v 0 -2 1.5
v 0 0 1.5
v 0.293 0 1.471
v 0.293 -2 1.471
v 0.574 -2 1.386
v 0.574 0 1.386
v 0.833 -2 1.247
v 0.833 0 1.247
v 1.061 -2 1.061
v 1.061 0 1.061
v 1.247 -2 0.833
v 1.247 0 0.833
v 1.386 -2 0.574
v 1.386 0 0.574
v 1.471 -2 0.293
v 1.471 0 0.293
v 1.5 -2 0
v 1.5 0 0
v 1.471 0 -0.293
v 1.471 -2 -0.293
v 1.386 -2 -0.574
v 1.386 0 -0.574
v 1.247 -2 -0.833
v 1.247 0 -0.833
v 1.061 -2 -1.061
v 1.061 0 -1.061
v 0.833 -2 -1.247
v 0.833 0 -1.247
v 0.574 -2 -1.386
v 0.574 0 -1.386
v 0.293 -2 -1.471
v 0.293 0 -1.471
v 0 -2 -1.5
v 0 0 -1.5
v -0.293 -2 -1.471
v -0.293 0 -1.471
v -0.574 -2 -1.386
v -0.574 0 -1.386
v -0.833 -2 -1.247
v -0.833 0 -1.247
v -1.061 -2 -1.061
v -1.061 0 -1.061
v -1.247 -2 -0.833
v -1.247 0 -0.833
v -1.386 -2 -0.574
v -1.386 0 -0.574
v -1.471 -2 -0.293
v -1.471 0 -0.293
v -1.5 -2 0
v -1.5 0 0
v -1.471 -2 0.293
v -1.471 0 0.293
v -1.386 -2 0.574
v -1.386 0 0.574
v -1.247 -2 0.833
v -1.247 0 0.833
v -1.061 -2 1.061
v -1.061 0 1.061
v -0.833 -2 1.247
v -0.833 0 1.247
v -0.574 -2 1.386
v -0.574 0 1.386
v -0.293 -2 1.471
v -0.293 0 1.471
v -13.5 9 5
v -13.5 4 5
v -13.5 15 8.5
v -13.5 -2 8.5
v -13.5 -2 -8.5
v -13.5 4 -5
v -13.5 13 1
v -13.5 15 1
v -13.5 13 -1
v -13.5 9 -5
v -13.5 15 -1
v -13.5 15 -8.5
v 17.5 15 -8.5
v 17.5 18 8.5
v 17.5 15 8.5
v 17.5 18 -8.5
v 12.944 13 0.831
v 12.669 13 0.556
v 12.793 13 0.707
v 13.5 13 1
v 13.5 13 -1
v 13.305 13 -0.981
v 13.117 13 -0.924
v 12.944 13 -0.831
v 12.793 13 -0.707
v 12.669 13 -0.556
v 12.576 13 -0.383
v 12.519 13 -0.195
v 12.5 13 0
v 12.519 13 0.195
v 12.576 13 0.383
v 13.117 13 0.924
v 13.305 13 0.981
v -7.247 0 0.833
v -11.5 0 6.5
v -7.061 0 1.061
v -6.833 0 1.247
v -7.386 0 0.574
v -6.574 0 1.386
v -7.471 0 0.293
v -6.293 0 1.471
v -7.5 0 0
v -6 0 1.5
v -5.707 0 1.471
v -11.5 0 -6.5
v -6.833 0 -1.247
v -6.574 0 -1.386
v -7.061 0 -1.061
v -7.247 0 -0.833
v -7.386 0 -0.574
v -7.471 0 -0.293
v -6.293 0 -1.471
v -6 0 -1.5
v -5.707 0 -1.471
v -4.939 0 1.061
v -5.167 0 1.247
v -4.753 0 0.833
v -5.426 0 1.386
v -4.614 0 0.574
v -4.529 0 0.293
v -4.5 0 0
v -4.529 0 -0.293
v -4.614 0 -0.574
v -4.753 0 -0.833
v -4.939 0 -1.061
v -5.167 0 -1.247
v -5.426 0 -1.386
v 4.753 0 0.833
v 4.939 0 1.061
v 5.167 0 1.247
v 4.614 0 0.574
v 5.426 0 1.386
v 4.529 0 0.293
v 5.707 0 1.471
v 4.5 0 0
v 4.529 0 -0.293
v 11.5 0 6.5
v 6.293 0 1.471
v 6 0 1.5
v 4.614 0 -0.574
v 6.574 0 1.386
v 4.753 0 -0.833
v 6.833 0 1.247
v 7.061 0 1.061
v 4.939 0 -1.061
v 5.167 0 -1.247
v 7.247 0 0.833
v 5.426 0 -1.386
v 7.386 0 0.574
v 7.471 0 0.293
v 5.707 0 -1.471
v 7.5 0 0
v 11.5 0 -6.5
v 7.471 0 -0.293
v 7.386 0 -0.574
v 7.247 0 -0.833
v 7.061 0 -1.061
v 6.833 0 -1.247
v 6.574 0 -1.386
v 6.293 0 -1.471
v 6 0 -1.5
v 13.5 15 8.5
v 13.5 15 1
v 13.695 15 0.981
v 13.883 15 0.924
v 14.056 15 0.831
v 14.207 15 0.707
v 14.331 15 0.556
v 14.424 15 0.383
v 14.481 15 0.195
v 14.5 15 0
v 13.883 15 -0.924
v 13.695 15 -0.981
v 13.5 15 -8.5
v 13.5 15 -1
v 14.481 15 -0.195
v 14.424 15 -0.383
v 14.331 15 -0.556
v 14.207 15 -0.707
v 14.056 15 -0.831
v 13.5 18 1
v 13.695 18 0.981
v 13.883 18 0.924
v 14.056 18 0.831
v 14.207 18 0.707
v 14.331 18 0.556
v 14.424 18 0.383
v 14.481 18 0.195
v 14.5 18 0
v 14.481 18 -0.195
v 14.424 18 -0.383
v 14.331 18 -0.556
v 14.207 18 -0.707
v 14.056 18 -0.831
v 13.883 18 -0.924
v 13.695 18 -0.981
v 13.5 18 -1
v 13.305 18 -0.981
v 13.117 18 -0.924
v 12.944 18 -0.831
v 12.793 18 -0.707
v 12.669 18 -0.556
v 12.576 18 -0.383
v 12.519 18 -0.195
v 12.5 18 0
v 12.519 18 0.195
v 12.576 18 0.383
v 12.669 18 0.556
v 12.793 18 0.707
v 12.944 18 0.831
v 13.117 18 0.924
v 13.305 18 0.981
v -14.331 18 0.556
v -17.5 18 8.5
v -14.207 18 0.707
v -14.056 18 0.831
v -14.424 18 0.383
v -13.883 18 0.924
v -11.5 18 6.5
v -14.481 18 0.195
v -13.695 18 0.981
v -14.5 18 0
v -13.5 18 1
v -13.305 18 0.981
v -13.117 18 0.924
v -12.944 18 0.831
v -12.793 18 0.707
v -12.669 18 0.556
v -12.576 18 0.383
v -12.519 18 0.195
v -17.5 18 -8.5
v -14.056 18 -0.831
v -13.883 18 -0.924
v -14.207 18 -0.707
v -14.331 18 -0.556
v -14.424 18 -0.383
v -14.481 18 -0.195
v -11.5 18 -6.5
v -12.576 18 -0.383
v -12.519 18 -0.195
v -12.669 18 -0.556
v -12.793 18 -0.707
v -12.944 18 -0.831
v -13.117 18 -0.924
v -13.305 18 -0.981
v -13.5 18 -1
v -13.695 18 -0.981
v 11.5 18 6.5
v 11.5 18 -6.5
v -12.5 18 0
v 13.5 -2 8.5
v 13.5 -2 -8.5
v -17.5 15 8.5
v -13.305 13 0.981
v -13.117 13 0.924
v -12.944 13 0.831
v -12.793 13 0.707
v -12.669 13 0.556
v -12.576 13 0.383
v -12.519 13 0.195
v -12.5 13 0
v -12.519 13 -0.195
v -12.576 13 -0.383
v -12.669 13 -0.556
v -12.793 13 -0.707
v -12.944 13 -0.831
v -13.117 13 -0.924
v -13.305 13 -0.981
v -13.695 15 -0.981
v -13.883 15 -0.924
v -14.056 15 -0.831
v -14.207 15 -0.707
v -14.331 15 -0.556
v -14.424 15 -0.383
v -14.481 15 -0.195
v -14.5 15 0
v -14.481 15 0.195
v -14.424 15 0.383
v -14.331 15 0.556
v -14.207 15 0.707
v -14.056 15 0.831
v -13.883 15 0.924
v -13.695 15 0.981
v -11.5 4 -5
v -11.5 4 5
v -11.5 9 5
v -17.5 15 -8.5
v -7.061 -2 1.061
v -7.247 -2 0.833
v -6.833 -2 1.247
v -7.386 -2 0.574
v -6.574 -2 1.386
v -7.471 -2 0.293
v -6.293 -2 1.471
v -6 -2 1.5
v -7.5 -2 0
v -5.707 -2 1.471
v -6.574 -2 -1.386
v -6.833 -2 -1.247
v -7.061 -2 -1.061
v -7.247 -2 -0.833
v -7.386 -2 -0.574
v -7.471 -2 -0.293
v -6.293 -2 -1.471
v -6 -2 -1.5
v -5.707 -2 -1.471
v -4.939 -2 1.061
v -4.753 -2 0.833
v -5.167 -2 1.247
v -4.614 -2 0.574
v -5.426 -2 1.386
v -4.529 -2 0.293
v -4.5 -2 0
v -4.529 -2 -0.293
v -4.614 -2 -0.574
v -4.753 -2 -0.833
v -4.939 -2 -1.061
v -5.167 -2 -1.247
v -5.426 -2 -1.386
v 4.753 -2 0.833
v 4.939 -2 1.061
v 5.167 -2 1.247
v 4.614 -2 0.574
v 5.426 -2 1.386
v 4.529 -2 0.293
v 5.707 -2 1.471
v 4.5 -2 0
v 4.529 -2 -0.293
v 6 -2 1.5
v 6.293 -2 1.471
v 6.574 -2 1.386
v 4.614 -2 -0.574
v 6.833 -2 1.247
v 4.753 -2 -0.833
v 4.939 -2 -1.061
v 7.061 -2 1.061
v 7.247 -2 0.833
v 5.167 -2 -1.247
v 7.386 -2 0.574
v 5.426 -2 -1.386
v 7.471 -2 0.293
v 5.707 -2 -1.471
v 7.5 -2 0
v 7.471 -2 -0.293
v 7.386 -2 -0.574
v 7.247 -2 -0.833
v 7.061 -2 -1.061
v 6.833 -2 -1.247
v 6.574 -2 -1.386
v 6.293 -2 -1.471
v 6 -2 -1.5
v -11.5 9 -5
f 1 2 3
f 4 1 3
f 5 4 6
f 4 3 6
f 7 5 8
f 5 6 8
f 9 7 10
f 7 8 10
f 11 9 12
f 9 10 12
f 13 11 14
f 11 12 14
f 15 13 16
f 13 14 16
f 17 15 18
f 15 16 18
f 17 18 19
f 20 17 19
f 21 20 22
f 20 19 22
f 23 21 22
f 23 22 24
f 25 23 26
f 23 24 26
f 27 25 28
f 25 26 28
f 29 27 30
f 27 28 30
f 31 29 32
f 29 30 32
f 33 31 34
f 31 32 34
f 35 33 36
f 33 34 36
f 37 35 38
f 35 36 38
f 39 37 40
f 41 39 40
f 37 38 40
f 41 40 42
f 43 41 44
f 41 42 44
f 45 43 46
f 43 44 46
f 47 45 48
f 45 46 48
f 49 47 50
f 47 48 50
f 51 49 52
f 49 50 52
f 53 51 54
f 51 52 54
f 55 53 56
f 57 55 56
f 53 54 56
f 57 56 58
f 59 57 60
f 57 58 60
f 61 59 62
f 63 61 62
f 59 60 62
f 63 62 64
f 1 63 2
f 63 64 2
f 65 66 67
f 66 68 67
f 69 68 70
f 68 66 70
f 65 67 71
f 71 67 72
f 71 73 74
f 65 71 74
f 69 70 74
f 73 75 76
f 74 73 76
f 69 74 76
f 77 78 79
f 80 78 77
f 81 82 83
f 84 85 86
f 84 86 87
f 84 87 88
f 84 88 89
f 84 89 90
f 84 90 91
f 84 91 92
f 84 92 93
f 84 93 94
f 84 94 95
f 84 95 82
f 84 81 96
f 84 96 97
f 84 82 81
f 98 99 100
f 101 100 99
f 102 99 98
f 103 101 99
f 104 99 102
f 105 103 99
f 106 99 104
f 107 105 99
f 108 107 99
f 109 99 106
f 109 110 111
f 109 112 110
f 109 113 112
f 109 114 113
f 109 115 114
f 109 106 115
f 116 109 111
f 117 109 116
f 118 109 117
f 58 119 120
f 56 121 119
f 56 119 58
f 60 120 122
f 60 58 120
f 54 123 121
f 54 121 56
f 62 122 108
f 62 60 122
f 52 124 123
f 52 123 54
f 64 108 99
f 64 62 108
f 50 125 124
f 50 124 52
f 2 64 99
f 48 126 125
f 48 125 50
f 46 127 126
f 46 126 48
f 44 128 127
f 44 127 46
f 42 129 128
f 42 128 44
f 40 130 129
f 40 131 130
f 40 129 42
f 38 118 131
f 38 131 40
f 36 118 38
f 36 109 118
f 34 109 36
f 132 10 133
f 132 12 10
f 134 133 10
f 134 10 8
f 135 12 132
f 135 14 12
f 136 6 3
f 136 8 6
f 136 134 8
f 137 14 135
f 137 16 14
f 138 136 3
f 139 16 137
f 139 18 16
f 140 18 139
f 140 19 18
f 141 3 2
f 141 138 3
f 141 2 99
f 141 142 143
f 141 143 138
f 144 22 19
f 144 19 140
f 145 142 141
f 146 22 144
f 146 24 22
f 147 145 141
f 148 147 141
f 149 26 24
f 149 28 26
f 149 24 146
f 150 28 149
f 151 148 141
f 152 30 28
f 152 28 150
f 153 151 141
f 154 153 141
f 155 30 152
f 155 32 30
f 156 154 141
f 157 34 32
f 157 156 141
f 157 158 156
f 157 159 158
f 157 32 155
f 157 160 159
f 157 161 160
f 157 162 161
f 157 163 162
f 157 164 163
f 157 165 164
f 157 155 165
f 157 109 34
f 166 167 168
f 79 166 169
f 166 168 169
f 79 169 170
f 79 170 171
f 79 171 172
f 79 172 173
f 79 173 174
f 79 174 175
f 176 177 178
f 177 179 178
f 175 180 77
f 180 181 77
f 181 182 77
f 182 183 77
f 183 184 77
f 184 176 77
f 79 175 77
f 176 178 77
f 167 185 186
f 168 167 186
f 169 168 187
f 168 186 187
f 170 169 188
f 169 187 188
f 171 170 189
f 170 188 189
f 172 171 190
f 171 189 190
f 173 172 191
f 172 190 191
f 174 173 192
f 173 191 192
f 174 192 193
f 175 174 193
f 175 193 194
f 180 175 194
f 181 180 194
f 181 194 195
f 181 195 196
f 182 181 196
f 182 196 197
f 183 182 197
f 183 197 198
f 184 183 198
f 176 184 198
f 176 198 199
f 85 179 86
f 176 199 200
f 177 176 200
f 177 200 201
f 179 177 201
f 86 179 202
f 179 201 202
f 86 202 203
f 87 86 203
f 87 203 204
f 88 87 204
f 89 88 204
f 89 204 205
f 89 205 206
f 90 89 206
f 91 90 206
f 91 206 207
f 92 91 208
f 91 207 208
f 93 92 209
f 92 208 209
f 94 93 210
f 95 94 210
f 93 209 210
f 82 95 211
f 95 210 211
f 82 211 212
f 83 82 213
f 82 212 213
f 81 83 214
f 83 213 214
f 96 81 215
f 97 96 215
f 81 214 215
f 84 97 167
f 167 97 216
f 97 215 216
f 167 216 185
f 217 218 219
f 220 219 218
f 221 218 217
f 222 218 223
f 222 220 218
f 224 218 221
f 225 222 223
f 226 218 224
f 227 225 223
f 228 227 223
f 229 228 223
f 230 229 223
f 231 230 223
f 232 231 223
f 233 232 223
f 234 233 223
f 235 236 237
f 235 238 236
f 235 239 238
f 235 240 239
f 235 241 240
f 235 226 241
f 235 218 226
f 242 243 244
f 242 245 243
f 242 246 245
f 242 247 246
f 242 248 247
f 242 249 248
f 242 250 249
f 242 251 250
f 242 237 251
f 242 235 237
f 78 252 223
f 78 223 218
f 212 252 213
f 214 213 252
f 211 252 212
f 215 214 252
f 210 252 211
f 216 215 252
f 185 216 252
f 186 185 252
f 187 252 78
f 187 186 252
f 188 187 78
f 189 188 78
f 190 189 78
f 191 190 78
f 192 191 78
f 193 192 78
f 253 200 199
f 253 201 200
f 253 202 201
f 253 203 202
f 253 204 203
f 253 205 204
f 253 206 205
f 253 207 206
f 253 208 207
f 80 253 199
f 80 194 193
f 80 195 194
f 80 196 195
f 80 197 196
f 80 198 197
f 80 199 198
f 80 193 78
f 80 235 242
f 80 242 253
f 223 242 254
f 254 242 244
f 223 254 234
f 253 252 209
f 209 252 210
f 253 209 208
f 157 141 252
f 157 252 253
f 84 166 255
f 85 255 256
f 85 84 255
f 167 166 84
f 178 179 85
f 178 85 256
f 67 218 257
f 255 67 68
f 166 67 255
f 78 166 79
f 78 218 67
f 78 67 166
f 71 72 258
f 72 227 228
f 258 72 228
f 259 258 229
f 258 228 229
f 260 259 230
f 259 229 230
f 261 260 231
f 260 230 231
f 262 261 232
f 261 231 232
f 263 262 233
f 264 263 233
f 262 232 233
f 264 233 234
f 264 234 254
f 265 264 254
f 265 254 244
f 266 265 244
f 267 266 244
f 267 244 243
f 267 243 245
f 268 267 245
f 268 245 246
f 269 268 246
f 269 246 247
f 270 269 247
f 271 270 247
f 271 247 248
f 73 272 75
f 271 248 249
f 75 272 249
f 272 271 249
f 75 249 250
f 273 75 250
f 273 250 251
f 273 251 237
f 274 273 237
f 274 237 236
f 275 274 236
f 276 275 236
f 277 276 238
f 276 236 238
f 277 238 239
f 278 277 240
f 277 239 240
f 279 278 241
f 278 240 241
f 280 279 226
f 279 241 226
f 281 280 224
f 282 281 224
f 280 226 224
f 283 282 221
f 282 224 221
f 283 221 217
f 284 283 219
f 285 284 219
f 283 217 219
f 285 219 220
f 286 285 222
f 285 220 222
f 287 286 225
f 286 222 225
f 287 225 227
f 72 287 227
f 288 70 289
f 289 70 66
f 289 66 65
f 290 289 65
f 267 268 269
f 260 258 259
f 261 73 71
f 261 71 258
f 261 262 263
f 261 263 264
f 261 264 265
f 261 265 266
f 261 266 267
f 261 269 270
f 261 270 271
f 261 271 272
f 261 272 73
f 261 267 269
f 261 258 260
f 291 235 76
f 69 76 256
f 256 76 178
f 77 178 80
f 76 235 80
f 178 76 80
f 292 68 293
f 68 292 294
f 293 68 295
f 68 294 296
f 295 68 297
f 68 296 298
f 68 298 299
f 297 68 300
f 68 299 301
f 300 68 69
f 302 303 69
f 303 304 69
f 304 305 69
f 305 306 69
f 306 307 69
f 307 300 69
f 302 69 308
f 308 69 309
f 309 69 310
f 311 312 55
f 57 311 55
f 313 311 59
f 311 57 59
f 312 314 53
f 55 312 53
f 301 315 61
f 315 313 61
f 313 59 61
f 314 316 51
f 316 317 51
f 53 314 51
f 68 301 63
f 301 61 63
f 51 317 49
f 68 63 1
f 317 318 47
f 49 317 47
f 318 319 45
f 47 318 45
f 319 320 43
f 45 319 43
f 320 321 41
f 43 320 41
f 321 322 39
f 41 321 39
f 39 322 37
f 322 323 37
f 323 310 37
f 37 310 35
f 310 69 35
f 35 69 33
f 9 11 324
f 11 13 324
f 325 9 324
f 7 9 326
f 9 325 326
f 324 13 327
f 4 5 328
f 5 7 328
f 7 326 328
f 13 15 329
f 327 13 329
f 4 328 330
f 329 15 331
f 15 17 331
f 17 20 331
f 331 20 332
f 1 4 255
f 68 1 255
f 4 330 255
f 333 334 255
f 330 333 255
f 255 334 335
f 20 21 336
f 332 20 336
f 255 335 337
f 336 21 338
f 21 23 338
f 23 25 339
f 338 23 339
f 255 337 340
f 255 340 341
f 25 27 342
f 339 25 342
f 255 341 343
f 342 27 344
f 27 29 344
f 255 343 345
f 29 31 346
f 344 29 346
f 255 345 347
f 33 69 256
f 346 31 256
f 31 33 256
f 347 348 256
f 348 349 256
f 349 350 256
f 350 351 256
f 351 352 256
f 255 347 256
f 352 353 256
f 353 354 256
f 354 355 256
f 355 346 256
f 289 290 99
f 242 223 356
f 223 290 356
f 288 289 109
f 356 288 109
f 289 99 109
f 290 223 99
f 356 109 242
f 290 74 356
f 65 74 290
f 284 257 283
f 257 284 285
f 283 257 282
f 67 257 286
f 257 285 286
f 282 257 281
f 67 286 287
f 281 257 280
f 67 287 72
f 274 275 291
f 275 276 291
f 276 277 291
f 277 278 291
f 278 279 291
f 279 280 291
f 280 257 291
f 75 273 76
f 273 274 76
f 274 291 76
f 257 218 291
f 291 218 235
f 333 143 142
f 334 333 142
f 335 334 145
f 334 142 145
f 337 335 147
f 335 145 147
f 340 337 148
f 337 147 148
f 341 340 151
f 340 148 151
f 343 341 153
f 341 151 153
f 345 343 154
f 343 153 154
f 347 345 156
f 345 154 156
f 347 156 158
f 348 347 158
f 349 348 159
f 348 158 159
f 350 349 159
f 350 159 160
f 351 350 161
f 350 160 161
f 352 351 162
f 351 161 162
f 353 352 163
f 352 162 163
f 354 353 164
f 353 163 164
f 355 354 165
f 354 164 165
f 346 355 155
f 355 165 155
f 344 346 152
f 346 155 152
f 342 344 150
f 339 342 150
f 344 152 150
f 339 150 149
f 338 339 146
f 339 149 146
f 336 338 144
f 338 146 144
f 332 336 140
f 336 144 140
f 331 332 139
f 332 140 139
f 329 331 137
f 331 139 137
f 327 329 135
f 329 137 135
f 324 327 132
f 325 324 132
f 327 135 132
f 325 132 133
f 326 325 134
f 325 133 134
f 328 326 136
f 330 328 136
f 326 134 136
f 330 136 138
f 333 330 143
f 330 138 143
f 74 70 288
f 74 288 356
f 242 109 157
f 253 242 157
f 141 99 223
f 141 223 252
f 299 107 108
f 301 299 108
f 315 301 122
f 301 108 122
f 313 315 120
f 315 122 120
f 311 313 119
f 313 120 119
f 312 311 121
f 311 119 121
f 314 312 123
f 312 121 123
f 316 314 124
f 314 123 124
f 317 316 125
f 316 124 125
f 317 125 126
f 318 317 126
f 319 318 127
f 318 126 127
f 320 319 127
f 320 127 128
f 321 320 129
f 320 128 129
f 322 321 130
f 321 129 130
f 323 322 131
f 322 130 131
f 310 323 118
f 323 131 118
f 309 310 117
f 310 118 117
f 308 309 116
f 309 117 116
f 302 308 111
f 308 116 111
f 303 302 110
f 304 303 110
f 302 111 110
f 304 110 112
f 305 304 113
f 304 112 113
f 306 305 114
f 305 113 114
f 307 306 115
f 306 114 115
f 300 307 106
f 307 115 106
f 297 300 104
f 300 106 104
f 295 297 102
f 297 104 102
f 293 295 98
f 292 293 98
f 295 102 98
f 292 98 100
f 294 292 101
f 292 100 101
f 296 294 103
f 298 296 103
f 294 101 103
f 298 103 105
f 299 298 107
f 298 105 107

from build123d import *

# Parameters (mm, degrees)
SKETCH1_W           = 27
SKETCH1_H           = 17
SKETCH1_W_2         = 23
SKETCH1_H_2         = 13
BOSS_EXTRUDE1_DEPTH = 18
SKETCH1_2_W         = 27
SKETCH1_2_H         = 17
BOSS_EXTRUDE2_DEPTH = 2
SKETCH2_R           = 1.5
CUT_EXTRUDE1_DEPTH  = 2
SKETCH3_W           = 10
SKETCH3_H           = 5
CUT_EXTRUDE2_DEPTH  = 3
SKETCH4_W           = 4
SKETCH4_H           = 17
BOSS_EXTRUDE3_DEPTH = 3
SKETCH5_R           = 1
CUT_EXTRUDE3_DEPTH  = 5


with BuildPart() as part:
    # Sketch1 → Boss-Extrude1 (new body)
    with BuildSketch(Plane(origin=(0, 0, 0), x_dir=(1, 0, 0), z_dir=(0, 1, 0))):
        Rectangle(SKETCH1_W, SKETCH1_H)
        Rectangle(SKETCH1_W_2, SKETCH1_H_2, mode=Mode.SUBTRACT)
    extrude(amount=BOSS_EXTRUDE1_DEPTH)

    # Sketch1<2> → Boss-Extrude2 (add)
    with BuildSketch(Plane(origin=(0, 0, 0), x_dir=(1, 0, 0), z_dir=(0, 1, 0))):
        Rectangle(SKETCH1_2_W, SKETCH1_2_H)
    extrude(amount=-BOSS_EXTRUDE2_DEPTH)

    # Sketch2 → Cut-Extrude1 (cut)
    with BuildSketch(Plane(origin=(0, 0, 0), x_dir=(1, 0, 0), z_dir=(0, 1, 0))):
        with Locations((-6, 0)):
            Circle(SKETCH2_R)
        Circle(SKETCH2_R)
        with Locations((6, 0)):
            Circle(SKETCH2_R)
    extrude(amount=-CUT_EXTRUDE1_DEPTH, mode=Mode.SUBTRACT)

    # Sketch3 → Cut-Extrude2 (cut)
    with BuildSketch(Plane.ZY.offset(13.5)):
        with Locations((0, 6.5)):
            Rectangle(SKETCH3_W, SKETCH3_H)
    extrude(amount=-CUT_EXTRUDE2_DEPTH, mode=Mode.SUBTRACT)

    # Sketch4 → Boss-Extrude3 (add)
    with BuildSketch(Plane(origin=(0, 18, 0), x_dir=(1, 0, 0), z_dir=(0, 1, 0))):
        with Locations((15.5, 0)):
            Rectangle(SKETCH4_W, SKETCH4_H)
        with Locations((-15.5, 0)):
            Rectangle(SKETCH4_W, SKETCH4_H)
    extrude(amount=-BOSS_EXTRUDE3_DEPTH)

    # Sketch5 → Cut-Extrude3 (cut)
    with BuildSketch(Plane(origin=(0, 18, 0), x_dir=(1, 0, 0), z_dir=(0, 1, 0))):
        with Locations((-13.5, 0)):
            Circle(SKETCH5_R)
        with Locations((13.5, 0)):
            Circle(SKETCH5_R)
    extrude(amount=-CUT_EXTRUDE3_DEPTH, mode=Mode.SUBTRACT)


solid = part.part
